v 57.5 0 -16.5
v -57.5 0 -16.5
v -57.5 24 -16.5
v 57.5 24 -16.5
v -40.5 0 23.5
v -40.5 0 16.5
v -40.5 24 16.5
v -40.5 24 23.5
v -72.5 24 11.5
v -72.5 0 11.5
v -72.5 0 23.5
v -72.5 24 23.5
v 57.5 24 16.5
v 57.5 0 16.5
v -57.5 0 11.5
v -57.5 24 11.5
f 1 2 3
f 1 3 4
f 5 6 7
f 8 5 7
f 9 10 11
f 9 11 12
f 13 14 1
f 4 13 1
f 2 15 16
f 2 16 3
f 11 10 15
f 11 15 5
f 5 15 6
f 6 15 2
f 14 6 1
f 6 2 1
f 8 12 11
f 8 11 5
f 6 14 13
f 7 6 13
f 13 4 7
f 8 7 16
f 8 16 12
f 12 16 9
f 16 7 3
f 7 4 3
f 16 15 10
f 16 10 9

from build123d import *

# Parameters (mm, degrees)
SKETCH1_W           = 115
SKETCH1_H           = 33
BOSS_EXTRUDE1_DEPTH = 24
SKETCH2_W           = 5
SKETCH2_H           = 24
BOSS_EXTRUDE2_DEPTH = 15
SKETCH3_W           = 17
SKETCH3_H           = 24
SKETCH3_W_2         = 15
BOSS_EXTRUDE3_DEPTH = 7


with BuildPart() as part:
    # Sketch1 → Boss-Extrude1 (new body)
    with BuildSketch(Plane(origin=(0, 0, 0), x_dir=(1, 0, 0), z_dir=(0, 1, 0))):
        Rectangle(SKETCH1_W, SKETCH1_H)
    extrude(amount=BOSS_EXTRUDE1_DEPTH)

    # Sketch2 → Boss-Extrude2 (add)
    with BuildSketch(Plane.ZY.offset(57.5)):
        with Locations((14, 12)):
            Rectangle(SKETCH2_W, SKETCH2_H)
    extrude(amount=BOSS_EXTRUDE2_DEPTH)

    # Sketch3 → Boss-Extrude3 (add)
    with BuildSketch(Plane.XY.offset(16.5)):
        with Locations((-49, 12)):
            Rectangle(SKETCH3_W, SKETCH3_H)
        with Locations((-65, 12)):
            Rectangle(SKETCH3_W_2, SKETCH3_H)
    extrude(amount=BOSS_EXTRUDE3_DEPTH)


solid = part.part
